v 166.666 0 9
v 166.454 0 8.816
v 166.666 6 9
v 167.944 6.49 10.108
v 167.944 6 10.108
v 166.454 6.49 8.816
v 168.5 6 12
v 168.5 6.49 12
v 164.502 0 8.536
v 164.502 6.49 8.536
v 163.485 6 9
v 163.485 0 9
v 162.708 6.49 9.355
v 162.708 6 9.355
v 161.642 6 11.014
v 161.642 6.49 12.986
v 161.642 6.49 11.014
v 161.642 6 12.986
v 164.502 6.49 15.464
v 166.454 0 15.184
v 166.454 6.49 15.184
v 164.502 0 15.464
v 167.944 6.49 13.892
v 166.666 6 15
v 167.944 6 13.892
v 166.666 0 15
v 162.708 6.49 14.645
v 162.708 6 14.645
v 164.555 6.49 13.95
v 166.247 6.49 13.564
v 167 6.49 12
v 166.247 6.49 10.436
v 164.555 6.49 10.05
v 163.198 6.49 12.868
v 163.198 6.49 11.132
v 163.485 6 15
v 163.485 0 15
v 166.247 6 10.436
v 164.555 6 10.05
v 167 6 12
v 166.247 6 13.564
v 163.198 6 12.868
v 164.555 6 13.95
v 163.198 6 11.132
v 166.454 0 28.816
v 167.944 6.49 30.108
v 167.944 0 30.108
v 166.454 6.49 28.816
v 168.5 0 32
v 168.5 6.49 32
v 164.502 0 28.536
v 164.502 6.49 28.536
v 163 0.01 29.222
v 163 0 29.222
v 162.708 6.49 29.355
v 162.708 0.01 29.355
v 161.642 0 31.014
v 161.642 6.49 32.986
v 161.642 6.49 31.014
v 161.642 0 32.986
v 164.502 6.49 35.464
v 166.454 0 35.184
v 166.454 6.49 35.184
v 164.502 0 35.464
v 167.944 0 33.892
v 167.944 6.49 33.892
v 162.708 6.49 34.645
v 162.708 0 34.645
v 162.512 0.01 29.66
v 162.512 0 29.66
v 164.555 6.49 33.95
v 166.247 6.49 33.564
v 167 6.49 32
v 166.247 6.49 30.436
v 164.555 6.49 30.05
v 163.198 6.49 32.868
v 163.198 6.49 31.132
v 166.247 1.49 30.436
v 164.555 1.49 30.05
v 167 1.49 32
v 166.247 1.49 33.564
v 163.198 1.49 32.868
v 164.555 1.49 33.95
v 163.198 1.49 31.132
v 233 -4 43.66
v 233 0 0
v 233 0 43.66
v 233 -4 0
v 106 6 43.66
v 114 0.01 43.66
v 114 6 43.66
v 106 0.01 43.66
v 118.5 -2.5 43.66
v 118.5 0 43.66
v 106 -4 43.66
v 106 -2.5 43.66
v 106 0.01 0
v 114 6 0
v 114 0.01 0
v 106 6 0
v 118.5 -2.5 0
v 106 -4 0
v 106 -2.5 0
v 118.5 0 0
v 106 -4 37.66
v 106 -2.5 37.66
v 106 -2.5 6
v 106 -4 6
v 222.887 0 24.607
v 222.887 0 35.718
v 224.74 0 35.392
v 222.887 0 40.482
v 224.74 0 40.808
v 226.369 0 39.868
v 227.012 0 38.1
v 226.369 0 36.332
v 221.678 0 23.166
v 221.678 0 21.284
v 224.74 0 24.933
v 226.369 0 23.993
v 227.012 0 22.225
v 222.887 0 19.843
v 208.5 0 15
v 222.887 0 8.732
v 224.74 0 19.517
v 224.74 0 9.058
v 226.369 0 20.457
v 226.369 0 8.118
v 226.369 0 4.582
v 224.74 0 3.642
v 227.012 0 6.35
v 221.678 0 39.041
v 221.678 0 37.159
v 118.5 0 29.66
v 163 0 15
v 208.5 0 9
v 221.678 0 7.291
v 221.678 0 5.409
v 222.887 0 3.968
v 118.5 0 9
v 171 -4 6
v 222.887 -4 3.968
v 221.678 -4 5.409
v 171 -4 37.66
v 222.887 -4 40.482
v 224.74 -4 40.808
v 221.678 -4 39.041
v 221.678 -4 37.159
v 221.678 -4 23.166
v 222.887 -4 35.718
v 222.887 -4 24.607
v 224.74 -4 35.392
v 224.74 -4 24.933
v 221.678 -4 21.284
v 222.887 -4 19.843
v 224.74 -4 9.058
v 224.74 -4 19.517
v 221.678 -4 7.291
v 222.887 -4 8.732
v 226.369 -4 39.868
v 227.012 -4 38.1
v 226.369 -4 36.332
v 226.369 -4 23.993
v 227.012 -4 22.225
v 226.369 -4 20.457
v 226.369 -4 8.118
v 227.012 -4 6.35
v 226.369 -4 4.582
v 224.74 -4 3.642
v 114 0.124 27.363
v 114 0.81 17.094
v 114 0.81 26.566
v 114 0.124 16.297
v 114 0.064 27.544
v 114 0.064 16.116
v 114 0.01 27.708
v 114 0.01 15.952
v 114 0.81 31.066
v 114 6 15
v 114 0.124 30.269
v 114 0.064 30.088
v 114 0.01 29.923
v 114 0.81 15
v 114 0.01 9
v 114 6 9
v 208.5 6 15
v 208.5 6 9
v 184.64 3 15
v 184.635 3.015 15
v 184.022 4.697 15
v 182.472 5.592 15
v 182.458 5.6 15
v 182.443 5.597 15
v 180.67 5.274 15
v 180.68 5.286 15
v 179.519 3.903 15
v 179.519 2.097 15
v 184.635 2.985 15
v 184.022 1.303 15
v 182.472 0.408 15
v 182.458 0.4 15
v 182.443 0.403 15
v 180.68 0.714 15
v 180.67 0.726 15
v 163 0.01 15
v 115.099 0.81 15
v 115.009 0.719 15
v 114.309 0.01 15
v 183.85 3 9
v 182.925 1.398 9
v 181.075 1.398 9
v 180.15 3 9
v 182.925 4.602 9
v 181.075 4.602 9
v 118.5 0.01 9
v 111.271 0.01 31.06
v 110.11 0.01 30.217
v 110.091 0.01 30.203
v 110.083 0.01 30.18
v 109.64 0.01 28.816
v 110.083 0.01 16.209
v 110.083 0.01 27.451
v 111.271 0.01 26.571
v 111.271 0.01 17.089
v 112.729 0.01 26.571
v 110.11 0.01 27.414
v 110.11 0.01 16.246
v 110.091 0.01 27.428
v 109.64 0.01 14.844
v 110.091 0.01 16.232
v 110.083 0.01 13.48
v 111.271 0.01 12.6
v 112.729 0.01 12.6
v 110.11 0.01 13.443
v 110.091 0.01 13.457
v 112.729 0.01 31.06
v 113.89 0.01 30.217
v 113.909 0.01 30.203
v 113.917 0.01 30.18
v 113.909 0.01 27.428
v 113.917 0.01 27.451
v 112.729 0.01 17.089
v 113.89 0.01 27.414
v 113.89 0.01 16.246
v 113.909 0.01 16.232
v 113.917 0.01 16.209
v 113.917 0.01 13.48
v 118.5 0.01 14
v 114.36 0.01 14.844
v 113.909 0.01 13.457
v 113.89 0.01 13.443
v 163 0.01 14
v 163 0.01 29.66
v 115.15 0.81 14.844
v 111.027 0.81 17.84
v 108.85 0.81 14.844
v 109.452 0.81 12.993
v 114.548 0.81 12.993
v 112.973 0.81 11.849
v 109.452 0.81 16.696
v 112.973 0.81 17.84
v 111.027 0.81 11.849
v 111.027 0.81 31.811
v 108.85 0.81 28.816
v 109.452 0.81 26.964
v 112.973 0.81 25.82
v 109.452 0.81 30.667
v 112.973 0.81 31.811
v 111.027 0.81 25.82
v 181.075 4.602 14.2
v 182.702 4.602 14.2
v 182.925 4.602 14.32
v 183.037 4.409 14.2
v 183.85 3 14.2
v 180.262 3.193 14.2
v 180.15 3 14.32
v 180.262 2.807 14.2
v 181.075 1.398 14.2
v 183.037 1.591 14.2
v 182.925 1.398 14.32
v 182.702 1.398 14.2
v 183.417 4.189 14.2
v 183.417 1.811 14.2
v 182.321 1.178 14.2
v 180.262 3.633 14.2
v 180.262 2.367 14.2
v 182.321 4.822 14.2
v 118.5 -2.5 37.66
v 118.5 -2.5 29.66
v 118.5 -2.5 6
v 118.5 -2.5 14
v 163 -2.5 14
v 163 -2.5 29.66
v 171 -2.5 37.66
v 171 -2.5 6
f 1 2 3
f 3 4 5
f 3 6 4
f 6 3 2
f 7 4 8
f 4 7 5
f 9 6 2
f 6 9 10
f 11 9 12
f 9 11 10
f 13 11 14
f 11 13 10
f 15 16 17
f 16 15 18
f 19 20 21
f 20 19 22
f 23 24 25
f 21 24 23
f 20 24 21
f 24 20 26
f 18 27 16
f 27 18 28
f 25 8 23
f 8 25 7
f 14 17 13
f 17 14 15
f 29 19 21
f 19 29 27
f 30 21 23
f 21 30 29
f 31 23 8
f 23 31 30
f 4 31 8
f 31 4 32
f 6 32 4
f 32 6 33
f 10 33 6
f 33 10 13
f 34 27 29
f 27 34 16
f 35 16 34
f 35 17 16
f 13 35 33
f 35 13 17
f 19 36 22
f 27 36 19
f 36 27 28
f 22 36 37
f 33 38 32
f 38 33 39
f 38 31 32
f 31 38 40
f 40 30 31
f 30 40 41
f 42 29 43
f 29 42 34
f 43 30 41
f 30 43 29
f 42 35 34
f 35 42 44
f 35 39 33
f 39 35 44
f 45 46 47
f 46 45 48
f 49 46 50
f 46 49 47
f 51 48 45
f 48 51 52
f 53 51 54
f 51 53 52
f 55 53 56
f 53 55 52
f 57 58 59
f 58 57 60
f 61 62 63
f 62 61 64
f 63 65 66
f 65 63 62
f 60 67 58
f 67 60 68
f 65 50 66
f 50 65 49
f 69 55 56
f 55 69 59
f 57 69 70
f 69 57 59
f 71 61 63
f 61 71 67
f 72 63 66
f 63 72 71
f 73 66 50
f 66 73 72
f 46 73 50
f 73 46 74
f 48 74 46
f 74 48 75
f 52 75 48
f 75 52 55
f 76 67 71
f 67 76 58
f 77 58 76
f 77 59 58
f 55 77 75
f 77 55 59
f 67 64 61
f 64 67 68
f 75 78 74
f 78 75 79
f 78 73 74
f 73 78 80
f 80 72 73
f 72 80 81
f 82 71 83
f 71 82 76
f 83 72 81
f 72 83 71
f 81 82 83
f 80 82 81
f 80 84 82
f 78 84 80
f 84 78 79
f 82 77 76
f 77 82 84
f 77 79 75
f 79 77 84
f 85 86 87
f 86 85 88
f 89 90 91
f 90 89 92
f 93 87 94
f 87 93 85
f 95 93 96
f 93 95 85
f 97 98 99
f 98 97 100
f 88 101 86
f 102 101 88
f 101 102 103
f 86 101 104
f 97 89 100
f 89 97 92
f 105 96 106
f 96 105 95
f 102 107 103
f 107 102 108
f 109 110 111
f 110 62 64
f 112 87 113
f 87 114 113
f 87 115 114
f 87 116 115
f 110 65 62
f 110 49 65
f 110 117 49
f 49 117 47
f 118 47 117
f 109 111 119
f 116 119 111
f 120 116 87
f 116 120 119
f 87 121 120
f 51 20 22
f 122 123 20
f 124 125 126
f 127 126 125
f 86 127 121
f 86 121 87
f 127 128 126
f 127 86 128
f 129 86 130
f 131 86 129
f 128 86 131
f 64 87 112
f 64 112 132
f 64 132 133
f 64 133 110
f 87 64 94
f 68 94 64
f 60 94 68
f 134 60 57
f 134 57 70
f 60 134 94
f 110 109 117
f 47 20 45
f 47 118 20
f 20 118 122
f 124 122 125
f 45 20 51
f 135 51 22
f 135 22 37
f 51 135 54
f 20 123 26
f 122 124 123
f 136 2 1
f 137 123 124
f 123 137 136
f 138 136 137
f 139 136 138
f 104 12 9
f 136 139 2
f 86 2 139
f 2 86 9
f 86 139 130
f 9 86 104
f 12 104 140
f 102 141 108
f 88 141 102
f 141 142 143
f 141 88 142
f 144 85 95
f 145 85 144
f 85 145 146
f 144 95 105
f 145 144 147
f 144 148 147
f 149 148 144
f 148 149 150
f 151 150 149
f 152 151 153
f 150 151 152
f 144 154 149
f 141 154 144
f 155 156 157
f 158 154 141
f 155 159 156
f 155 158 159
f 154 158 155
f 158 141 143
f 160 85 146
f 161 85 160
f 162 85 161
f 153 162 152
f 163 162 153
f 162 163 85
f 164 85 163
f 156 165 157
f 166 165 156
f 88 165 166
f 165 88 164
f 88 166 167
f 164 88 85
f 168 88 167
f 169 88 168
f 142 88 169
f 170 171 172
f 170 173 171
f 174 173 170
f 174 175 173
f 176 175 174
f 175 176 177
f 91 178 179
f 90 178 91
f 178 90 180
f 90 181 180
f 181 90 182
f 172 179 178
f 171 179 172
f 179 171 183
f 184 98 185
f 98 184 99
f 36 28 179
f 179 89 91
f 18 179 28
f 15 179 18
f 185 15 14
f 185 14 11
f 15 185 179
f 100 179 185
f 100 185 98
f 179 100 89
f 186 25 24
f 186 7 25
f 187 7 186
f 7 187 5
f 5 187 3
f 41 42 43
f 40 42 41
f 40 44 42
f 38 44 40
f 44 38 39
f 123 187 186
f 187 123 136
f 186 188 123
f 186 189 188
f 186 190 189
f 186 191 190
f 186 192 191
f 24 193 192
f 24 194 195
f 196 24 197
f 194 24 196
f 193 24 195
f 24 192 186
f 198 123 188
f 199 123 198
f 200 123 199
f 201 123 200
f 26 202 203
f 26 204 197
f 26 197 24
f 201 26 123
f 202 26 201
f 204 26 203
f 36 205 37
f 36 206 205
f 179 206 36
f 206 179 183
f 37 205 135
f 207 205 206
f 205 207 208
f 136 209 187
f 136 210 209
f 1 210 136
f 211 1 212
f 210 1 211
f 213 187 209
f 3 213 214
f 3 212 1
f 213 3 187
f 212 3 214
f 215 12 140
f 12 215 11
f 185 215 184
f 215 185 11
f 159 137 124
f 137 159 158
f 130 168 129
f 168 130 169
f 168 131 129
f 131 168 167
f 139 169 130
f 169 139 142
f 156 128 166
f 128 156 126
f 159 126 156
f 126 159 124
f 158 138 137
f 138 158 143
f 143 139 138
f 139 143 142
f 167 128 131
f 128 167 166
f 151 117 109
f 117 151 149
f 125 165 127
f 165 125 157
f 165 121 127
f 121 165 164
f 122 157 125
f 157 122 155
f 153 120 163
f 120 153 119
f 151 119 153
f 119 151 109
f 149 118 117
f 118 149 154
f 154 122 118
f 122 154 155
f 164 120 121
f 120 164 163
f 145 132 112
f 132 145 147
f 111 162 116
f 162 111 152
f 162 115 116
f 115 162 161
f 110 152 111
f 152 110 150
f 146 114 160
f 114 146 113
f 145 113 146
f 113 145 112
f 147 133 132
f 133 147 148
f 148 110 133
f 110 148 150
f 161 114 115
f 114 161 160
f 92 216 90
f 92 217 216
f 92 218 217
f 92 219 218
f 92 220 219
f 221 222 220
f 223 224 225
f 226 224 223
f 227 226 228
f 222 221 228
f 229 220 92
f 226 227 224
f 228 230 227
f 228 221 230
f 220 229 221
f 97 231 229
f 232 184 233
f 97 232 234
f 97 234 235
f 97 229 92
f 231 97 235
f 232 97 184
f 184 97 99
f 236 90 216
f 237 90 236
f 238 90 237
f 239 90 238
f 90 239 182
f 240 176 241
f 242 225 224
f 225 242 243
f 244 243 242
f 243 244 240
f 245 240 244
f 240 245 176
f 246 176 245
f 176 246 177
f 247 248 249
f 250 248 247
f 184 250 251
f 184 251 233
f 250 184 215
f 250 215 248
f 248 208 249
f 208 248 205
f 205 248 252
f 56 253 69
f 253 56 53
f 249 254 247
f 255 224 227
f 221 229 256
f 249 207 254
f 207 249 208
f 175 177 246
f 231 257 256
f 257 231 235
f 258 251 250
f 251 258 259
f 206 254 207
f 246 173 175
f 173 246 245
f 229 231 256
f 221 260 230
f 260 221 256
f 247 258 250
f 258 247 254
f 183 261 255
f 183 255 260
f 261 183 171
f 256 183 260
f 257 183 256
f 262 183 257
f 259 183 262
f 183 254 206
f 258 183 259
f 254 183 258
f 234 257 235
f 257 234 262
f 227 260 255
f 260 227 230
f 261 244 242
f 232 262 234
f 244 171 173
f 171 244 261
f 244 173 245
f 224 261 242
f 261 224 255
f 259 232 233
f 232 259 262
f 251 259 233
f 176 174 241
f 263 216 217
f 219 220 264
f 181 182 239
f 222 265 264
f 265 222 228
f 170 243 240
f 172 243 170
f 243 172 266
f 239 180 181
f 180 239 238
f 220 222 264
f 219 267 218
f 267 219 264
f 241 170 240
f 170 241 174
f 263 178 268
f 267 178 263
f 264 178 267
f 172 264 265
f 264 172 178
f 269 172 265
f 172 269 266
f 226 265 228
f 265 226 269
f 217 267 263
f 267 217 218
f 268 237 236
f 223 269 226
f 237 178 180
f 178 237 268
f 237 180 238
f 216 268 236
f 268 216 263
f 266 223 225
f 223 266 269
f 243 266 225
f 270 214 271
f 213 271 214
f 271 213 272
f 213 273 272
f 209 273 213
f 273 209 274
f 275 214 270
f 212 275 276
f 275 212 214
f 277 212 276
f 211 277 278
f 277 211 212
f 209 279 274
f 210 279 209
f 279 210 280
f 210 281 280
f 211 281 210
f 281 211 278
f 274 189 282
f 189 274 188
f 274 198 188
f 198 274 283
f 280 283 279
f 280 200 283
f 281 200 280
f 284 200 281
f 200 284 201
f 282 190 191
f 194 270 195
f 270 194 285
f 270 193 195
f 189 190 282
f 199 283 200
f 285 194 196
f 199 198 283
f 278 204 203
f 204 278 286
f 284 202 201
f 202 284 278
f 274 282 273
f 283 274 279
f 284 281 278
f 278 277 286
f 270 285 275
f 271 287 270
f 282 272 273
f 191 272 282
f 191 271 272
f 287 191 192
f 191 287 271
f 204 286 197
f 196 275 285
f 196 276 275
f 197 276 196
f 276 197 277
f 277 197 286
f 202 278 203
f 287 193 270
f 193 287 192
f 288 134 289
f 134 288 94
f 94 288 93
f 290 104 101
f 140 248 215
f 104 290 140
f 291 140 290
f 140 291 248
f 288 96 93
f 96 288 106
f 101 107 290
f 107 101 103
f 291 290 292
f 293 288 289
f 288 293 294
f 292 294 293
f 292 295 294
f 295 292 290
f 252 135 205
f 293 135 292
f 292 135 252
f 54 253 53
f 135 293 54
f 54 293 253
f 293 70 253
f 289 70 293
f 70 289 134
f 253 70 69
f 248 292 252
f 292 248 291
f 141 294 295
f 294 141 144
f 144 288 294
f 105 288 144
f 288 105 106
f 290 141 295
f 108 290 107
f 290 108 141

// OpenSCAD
// =====================================================================
// parts/faceplate_right.scad  ->  faceplate_right()
// Project: Dell Inspiron 15-5558/5559 motherboard -> NiH DIY 10" rack
// Printer: Ender 3 V3 SE (bed 220x220x250). Material: PETG.
//
// RIGHT half of the 254mm-wide split faceplate (the LEFT|RIGHT seam is at
// the rack centerline X = FACE_SPLIT_X). This tile spans
//   X  FACE_SPLIT_X .. FACE_X1   (FACE_TILE_W wide)
//   Y  -FACE_T .. 0              (the faceplate plate, thin in depth)
//   Z  0 .. FACE_H (43.66)       (the 1U EIA panel — NOTHING exceeds it)
//
// Modeled DIRECTLY in the GLOBAL ASSEMBLY FRAME so it mates with its
// neighbors (faceplate_left at the seam, baseplate_front lip at the bottom
// flange) with NO transform in main.scad.
//
// FROZEN CONTRACT: params come from params.scad; joinery from
// lib/joinery.scad. This file does NOT redefine any of them.
//
// SEAMS:
//   - Whole RIGHT M5 rack column at X = M5_X_RIGHT, drilled with
//     eia_face_holes() over the three 1U EIA_FACE_HOLES_Z holes.
//   - CENTER seam at X = FACE_SPLIT_X: a BOLTED-OVERLAP lap seam (replaces
//     the old dovetail_female pocket + transverse pin/dowel scheme). This
//     RIGHT tile carries:
//       * a solid SEAM RAIL along its inner edge (meat behind the thin slab),
//       * a REBATE in its BACK half over the lap region so faceplate_left's
//         partial-thickness lap tongue nests in and the outer faces stay flush,
//       * 2 M3 SLOTTED clearance holes (M3_SLOT_W) through the overlap with
//         CHAMFER lead-ins, matching the left tile, so they bolt with slop.
//   - BOTTOM flange: tongue() that beds into the baseplate_front lip, plus
//     M3 clearance holes (chamfered) to bolt down.
//   - RIGHT part of the recessed io_subplate window + that side's M3 bosses.
//
// PRINTABILITY: prints FLAT, largest face (the X-Z plate) down on the bed.
// Plate is FACE_TILE_W (X) x FACE_H (Z) -> both <= PRINT_MAX_XY. The seam
// rail / bosses grow +Y (up off the bed); the rebate is a back-face pocket;
// nothing bridges. Renders Simple: yes, Zmax = FACE_H.
// =====================================================================

include <params.scad>
use <../lib/joinery.scad>

// ---------------------------------------------------------------------
// Local design constants for THIS tile (kept local; not contract globals)
// ---------------------------------------------------------------------
FR_X0        = FACE_SPLIT_X;          // tile inner (seam) edge
FR_X1        = FACE_X1;               // tile outer edge
FR_W         = FR_X1 - FR_X0;         // tile width (== FACE_TILE_W)
FR_H         = FACE_H;                // tile height in Z (1U panel)
FR_T         = FACE_T;                // plate thickness (Y), at Y -FACE_T..0

// ---- center-seam BOLTED-OVERLAP geometry (MUST match faceplate_left) -----
// The LEFT tile owns the lap TONGUE (back half, Y -LAP_T..0, reaching LAP_LEN
// past the seam). THIS tile owns the matching REBATE so the tongue nests in,
// and a SEAM RAIL for meat. FIT_CLEARANCE on the rebate absorbs printer slop.
SEAM_RAIL_W     = 8;                  // X-width of the solid seam rail (meat)
SEAM_RAIL_T     = 6;                  // seam-rail depth into the body (+Y)
LAP_LEN         = 12;                 // tongue reach past the seam into +X
LAP_T           = FR_T / 2;           // tongue thickness (back half of FACE_T)
LAP_BOLT_Z      = [ FR_H * 0.34, FR_H * 0.66 ];  // 2 bolt heights (Z), match left
LAP_BOLT_X      = FR_X0 + LAP_LEN/2;             // bolt X (mid-overlap), match left
LAP_SLOT_TRAVEL = 3;                  // X-elongation of the slot (in/out slop)

// ---- bottom flange: rests ON TOP of the front lip, bolts straight DOWN ----
// (mirror faceplate_left: replaces the old floor-tongue that collided with the
//  solid lip and the HORIZONTAL bolts that hit no pilot)
FLANGE_H     = 6;                     // flange height above the lip top (Z)
FR_FLANGE_X1 = min(FR_X1, BODY_W - WALL_T - FIT_CLEARANCE); // clip to the lip + clear the wall (loose-fit)

// ---- io_subplate window: RIGHT part of the full window ----
// Full window in assembly frame: X IO_WIN_X0 .. IO_WIN_X0+IO_SUB_W,
// Z IO_WIN_Z0 .. IO_WIN_Z0+IO_SUB_H (capped under the 1U panel). This tile
// owns the X >= FR_X0 portion. The subplate FOOTPRINT (recess) spans the full
// envelope; the THROUGH-OPENING is inset by IO_FRAME so a seating lip remains.
IO_FOOT_X0   = IO_WIN_X0;
IO_FOOT_X1   = IO_WIN_X0 + IO_SUB_W;
IO_FOOT_Z0   = IO_WIN_Z0;
IO_FOOT_Z1   = min(IO_WIN_Z0 + IO_SUB_H, FR_H - 6); // capped under the 1U panel
IO_FRAME     = 8;                     // seating-lip width around the opening
IO_OPEN_X0   = IO_FOOT_X0 + IO_FRAME;
IO_OPEN_X1   = IO_FOOT_X1 - IO_FRAME;
IO_OPEN_Z0   = IO_FOOT_Z0 + IO_FRAME;
IO_OPEN_Z1   = IO_FOOT_Z1 - IO_FRAME;
IO_RECESS    = 1.5;                   // recess depth so subplate sits flush // MEASURE
function io_m3_to_asm(p) = [ IO_WIN_X0 + p[0], IO_WIN_Z0 + p[1] ];


// ---- local helper: chamfered slotted bolt hole (axis +Y) --------------
// Elongated in X by `travel`, bored through Y `thru`, with a CHAMFER lead-in
// cone at the entry (+Y) face. Origin = slot center on the inner (Y=0) face.
module lap_bolt_slot(travel, thru) {
    translate([0, thru + EPS, 0])
        rotate([90, 0, 0])
            linear_extrude(height = thru + 2*EPS)
                hull() {
                    translate([-travel/2, 0]) circle(d = M3_SLOT_W);
                    translate([ travel/2, 0]) circle(d = M3_SLOT_W);
                }
    translate([0, thru, 0])
        rotate([-90, 0, 0])
            cylinder(h = CHAMFER + EPS,
                     d1 = M3_SLOT_W, d2 = M3_SLOT_W + 2*CHAMFER);
}


// ---------------------------------------------------------------------
module faceplate_right() {
    difference() {
        union() {
            // ---- main faceplate plate (this tile) -------------------
            translate([FR_X0, -FR_T, 0])
                cube([FR_W, FR_T, FR_H]);

            // ---- center seam RAIL (meat behind the thin slab) -------
            // Solid rail along the inner (seam) edge, grown +Y into the body
            // (Y 0..SEAM_RAIL_T). It sits body-side of the plate, clear of the
            // back-half rebate (Y -LAP_T..0) and of the left tile's tongue.
            translate([FR_X0, 0, 0])
                cube([SEAM_RAIL_W, SEAM_RAIL_T, FR_H]);

            // ---- bottom flange (rests ON TOP of the baseplate front lip) --
            translate([FR_X0, -EPS, LIP_TOP_Z])
                cube([FR_FLANGE_X1 - FR_X0, LIP_T + EPS, FLANGE_H]);

            // ---- io_subplate mount bosses (right-side pair) ---------
            for (p = IO_SUB_M3) {
                a = io_m3_to_asm(p);
                if (a[0] >= FR_X0) {            // only bosses on THIS tile
                    translate([a[0], 0 - EPS, a[1]])
                        rotate([-90, 0, 0])     // boss axis -> +Y (toward body)
                            heatset_boss(M3_BOSS_OD, M3_INSERT_BORE,
                                         M3_INSERT_DEPTH + 1.5, M3_INSERT_DEPTH, EPS);
                }
            }
        }

        // =================================================================
        // SUBTRACTIONS (clean through-cuts / pockets / bores)
        // =================================================================

        // ---- M5 rack column (whole RIGHT column, 3x 1U) -------------
        // eia_face_holes drills +Y at X=x for each Z; bore through FR_T. Plate
        // is at Y -FR_T..0, so shift by -FR_T. EIA_FACE_HOLES_Z = three 1U holes.
        translate([0, -FR_T, 0])
            eia_face_holes(EIA_FACE_HOLES_Z, M5_X_RIGHT, M5_CLEAR, FR_T, EPS);

        // ---- center-seam REBATE for the left tile's lap tongue ------
        // Remove the BACK half (Y -LAP_T..0) over the overlap region so the
        // left tongue nests flush. Oversized by FIT_CLEARANCE on the loose
        // faces (depth/length) so a dimensionally loose print still seats.
        translate([FR_X0 - EPS, -LAP_T - FIT_CLEARANCE, -EPS])
            cube([LAP_LEN + FIT_CLEARANCE + EPS,
                  LAP_T + FIT_CLEARANCE + EPS,
                  FR_H + 2*EPS]);

        // ---- center-seam 2x M3 SLOTTED bolt holes (chamfered) -------
        // Through the front-half material remaining over the overlap, axis +Y,
        // elongated in X for slop. Matches the left tile's slot positions so a
        // single bolt clamps both overlapping layers.
        for (bz = LAP_BOLT_Z)
            translate([LAP_BOLT_X, -FR_T, bz])
                lap_bolt_slot(LAP_SLOT_TRAVEL, FR_T);

        // ---- bottom-flange M3 bolt-down holes (VERTICAL, chamfered) -
        // Drop straight DOWN into the front-lip pilots THIS tile owns
        // (the X>seam columns of PANEL_PILOT_X) — matches faceplate_left.
        for (fx = PANEL_PILOT_X)
            if (fx > FACE_SPLIT_X + 2 && fx < FR_FLANGE_X1) {
                translate([fx, FRONT_PILOT_Y, LIP_TOP_Z - EPS])
                    cylinder(h = FLANGE_H + 2*EPS, d = M3_CLEAR);
                translate([fx, FRONT_PILOT_Y, LIP_TOP_Z + FLANGE_H - CHAMFER])
                    cylinder(h = CHAMFER + EPS,
                             d1 = M3_CLEAR, d2 = M3_CLEAR + 2*CHAMFER);
            }

        // ---- io_subplate window (RIGHT part) ------------------------
        // This tile owns X >= FR_X0. Clip both cuts to X >= FR_X0.
        // 1) Through-opening (full plate thickness) — inset by IO_FRAME:
        op_x0 = max(IO_OPEN_X0, FR_X0);
        translate([op_x0 - EPS, -FR_T - EPS, IO_OPEN_Z0])
            cube([ (IO_OPEN_X1 - op_x0) + EPS,
                   FR_T + 2*EPS,
                   (IO_OPEN_Z1 - IO_OPEN_Z0) ]);
        // 2) Front recess shelf (footprint-sized pocket on the FRONT face):
        rc_x0 = max(IO_FOOT_X0, FR_X0);
        translate([rc_x0 - EPS, -FR_T - EPS, IO_FOOT_Z0])
            cube([ (IO_FOOT_X1 - rc_x0) + EPS,
                   IO_RECESS + EPS,
                   (IO_FOOT_Z1 - IO_FOOT_Z0) ]);
    }
}

// ---------------------------------------------------------------------
// Standalone render: this part renders alone when opened directly.
// ---------------------------------------------------------------------
faceplate_right();
